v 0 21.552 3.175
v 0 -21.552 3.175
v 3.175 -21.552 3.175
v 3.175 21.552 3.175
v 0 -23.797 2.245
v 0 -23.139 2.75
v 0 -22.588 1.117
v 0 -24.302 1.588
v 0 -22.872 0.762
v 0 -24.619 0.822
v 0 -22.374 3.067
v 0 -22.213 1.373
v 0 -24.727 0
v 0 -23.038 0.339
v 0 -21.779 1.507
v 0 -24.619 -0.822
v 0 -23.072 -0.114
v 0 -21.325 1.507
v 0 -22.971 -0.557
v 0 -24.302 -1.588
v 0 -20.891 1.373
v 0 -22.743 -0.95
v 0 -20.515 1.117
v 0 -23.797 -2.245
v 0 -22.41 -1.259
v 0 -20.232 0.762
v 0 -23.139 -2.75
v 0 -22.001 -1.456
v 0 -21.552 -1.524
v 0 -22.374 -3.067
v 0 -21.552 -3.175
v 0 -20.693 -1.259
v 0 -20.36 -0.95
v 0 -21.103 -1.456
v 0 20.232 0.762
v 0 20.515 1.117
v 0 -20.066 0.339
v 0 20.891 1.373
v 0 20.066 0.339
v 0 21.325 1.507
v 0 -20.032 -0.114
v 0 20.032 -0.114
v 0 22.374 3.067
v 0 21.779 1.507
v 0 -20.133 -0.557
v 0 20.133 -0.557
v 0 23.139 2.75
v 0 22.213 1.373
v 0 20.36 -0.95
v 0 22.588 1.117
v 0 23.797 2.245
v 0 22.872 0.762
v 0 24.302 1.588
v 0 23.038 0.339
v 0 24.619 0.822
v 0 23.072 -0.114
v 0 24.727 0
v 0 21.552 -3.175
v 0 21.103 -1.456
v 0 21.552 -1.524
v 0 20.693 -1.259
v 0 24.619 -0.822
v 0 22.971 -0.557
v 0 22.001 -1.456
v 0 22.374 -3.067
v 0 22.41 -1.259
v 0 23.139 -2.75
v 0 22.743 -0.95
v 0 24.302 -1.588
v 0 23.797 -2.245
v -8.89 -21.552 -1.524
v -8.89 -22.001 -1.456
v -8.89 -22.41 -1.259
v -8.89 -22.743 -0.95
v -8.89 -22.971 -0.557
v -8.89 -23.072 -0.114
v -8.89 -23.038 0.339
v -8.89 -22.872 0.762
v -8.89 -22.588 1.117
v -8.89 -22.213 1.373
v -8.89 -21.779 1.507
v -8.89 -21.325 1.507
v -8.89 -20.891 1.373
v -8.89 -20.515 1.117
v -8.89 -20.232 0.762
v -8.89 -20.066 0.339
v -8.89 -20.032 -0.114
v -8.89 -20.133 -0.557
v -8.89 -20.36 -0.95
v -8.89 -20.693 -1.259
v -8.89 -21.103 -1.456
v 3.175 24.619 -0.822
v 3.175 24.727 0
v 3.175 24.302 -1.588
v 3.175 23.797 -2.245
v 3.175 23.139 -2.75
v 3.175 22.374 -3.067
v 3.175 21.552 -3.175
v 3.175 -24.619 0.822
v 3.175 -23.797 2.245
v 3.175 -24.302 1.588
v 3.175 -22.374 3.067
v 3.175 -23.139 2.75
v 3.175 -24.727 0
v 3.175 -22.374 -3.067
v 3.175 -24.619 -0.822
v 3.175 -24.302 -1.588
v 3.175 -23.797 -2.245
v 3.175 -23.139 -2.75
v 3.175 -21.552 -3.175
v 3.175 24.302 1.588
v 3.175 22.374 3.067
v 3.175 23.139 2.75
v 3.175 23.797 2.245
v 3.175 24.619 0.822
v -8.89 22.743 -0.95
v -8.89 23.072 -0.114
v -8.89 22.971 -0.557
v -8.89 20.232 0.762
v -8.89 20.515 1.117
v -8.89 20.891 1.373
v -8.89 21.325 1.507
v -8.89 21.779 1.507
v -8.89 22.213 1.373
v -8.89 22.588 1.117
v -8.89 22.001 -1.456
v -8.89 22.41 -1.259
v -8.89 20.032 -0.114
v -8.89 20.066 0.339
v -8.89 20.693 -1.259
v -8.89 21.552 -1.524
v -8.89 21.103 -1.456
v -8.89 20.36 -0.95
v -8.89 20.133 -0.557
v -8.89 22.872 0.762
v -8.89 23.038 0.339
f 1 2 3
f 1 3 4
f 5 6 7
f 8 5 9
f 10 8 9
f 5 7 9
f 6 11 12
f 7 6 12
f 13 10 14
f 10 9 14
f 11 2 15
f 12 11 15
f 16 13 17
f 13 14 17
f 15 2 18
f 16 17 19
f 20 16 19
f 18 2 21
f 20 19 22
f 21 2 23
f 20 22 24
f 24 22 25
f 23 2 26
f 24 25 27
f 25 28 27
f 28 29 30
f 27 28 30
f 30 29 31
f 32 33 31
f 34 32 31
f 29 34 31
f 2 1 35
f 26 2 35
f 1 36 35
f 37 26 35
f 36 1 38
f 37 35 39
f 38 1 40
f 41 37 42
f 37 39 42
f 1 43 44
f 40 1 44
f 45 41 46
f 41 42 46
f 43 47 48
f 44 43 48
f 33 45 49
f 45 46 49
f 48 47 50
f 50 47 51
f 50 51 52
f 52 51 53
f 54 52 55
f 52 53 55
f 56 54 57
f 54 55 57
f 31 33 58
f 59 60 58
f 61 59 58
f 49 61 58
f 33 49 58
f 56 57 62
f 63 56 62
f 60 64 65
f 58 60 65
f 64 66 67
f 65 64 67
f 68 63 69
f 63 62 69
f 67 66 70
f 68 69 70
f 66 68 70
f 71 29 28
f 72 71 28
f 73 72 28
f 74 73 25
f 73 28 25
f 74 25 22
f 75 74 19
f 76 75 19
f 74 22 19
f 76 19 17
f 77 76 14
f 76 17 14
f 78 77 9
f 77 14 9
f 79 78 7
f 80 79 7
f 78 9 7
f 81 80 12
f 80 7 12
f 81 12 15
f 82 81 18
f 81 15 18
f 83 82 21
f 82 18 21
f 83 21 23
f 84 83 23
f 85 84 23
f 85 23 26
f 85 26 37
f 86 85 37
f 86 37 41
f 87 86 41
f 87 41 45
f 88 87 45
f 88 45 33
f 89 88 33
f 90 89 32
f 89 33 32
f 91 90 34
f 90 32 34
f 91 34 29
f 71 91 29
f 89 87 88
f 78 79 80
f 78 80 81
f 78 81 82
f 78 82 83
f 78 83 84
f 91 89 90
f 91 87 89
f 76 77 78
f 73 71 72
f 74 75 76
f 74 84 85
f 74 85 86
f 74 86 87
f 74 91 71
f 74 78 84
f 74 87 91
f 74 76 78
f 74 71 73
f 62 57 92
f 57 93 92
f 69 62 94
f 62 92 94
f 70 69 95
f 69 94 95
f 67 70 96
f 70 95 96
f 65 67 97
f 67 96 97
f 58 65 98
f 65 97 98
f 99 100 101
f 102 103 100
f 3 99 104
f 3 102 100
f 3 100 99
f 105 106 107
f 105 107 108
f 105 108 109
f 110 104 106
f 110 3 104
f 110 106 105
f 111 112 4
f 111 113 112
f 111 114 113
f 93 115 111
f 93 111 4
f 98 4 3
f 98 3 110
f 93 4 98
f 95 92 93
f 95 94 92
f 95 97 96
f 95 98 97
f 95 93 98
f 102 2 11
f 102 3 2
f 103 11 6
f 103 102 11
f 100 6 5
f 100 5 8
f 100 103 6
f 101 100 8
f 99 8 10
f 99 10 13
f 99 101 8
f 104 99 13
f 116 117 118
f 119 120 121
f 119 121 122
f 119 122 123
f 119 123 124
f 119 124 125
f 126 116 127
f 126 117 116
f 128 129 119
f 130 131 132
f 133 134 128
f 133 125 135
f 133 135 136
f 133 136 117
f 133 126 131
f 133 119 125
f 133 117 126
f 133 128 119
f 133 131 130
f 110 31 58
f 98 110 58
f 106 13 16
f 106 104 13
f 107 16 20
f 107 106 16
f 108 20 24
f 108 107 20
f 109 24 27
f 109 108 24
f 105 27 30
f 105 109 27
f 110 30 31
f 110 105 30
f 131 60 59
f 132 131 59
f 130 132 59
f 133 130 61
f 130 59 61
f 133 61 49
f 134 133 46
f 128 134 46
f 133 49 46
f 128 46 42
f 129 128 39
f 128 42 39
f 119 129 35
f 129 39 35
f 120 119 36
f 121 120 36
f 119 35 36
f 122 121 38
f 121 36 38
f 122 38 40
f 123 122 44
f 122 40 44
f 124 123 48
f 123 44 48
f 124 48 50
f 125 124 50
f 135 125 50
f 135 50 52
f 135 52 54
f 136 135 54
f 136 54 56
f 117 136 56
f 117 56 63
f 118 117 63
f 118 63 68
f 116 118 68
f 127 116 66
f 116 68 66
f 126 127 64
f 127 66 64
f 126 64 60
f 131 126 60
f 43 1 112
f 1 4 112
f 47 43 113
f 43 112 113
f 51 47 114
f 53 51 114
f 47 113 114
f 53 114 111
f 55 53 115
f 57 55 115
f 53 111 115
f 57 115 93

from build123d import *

# Parameters (mm, degrees)
SKETCH1_W           = 6.35
SKETCH1_H           = 49.4538
BOSS_EXTRUDE1_DEPTH = 3.175
SKETCH2_R           = 1.524
BOSS_EXTRUDE2_DEPTH = 8.89
FILLET1_R           = 3.175


with BuildPart() as part:
    # Sketch1 → Boss-Extrude1 (new body)
    with BuildSketch(Plane(origin=(0, 0, 0), x_dir=(0, 0, -1), z_dir=(1, 0, 0))):
        Rectangle(SKETCH1_W, SKETCH1_H)
    extrude(amount=BOSS_EXTRUDE1_DEPTH)

    # Sketch2 → Boss-Extrude2 (add)
    with BuildSketch(Plane.ZY):
        with Locations(Location((0, 21.5519, 0), (0, 0, 180))):
            Circle(SKETCH2_R)
        with Locations(Location((0, -21.5519, 0), (0, 0, 180))):
            Circle(SKETCH2_R)
    extrude(amount=BOSS_EXTRUDE2_DEPTH)

    # Fillet1
    fillet1_edges = [part.edges().sort_by_distance(p)[0] for p in [
        (1.5875, -24.7269, 3.175),
        (1.5875, -24.7269, -3.175),
        (1.5875, 24.7269, -3.175),
        (1.5875, 24.7269, 3.175),
    ]]
    fillet(fillet1_edges, radius=FILLET1_R - 0.0001)  # a hair under: the kernel refuses the full size


solid = part.part
